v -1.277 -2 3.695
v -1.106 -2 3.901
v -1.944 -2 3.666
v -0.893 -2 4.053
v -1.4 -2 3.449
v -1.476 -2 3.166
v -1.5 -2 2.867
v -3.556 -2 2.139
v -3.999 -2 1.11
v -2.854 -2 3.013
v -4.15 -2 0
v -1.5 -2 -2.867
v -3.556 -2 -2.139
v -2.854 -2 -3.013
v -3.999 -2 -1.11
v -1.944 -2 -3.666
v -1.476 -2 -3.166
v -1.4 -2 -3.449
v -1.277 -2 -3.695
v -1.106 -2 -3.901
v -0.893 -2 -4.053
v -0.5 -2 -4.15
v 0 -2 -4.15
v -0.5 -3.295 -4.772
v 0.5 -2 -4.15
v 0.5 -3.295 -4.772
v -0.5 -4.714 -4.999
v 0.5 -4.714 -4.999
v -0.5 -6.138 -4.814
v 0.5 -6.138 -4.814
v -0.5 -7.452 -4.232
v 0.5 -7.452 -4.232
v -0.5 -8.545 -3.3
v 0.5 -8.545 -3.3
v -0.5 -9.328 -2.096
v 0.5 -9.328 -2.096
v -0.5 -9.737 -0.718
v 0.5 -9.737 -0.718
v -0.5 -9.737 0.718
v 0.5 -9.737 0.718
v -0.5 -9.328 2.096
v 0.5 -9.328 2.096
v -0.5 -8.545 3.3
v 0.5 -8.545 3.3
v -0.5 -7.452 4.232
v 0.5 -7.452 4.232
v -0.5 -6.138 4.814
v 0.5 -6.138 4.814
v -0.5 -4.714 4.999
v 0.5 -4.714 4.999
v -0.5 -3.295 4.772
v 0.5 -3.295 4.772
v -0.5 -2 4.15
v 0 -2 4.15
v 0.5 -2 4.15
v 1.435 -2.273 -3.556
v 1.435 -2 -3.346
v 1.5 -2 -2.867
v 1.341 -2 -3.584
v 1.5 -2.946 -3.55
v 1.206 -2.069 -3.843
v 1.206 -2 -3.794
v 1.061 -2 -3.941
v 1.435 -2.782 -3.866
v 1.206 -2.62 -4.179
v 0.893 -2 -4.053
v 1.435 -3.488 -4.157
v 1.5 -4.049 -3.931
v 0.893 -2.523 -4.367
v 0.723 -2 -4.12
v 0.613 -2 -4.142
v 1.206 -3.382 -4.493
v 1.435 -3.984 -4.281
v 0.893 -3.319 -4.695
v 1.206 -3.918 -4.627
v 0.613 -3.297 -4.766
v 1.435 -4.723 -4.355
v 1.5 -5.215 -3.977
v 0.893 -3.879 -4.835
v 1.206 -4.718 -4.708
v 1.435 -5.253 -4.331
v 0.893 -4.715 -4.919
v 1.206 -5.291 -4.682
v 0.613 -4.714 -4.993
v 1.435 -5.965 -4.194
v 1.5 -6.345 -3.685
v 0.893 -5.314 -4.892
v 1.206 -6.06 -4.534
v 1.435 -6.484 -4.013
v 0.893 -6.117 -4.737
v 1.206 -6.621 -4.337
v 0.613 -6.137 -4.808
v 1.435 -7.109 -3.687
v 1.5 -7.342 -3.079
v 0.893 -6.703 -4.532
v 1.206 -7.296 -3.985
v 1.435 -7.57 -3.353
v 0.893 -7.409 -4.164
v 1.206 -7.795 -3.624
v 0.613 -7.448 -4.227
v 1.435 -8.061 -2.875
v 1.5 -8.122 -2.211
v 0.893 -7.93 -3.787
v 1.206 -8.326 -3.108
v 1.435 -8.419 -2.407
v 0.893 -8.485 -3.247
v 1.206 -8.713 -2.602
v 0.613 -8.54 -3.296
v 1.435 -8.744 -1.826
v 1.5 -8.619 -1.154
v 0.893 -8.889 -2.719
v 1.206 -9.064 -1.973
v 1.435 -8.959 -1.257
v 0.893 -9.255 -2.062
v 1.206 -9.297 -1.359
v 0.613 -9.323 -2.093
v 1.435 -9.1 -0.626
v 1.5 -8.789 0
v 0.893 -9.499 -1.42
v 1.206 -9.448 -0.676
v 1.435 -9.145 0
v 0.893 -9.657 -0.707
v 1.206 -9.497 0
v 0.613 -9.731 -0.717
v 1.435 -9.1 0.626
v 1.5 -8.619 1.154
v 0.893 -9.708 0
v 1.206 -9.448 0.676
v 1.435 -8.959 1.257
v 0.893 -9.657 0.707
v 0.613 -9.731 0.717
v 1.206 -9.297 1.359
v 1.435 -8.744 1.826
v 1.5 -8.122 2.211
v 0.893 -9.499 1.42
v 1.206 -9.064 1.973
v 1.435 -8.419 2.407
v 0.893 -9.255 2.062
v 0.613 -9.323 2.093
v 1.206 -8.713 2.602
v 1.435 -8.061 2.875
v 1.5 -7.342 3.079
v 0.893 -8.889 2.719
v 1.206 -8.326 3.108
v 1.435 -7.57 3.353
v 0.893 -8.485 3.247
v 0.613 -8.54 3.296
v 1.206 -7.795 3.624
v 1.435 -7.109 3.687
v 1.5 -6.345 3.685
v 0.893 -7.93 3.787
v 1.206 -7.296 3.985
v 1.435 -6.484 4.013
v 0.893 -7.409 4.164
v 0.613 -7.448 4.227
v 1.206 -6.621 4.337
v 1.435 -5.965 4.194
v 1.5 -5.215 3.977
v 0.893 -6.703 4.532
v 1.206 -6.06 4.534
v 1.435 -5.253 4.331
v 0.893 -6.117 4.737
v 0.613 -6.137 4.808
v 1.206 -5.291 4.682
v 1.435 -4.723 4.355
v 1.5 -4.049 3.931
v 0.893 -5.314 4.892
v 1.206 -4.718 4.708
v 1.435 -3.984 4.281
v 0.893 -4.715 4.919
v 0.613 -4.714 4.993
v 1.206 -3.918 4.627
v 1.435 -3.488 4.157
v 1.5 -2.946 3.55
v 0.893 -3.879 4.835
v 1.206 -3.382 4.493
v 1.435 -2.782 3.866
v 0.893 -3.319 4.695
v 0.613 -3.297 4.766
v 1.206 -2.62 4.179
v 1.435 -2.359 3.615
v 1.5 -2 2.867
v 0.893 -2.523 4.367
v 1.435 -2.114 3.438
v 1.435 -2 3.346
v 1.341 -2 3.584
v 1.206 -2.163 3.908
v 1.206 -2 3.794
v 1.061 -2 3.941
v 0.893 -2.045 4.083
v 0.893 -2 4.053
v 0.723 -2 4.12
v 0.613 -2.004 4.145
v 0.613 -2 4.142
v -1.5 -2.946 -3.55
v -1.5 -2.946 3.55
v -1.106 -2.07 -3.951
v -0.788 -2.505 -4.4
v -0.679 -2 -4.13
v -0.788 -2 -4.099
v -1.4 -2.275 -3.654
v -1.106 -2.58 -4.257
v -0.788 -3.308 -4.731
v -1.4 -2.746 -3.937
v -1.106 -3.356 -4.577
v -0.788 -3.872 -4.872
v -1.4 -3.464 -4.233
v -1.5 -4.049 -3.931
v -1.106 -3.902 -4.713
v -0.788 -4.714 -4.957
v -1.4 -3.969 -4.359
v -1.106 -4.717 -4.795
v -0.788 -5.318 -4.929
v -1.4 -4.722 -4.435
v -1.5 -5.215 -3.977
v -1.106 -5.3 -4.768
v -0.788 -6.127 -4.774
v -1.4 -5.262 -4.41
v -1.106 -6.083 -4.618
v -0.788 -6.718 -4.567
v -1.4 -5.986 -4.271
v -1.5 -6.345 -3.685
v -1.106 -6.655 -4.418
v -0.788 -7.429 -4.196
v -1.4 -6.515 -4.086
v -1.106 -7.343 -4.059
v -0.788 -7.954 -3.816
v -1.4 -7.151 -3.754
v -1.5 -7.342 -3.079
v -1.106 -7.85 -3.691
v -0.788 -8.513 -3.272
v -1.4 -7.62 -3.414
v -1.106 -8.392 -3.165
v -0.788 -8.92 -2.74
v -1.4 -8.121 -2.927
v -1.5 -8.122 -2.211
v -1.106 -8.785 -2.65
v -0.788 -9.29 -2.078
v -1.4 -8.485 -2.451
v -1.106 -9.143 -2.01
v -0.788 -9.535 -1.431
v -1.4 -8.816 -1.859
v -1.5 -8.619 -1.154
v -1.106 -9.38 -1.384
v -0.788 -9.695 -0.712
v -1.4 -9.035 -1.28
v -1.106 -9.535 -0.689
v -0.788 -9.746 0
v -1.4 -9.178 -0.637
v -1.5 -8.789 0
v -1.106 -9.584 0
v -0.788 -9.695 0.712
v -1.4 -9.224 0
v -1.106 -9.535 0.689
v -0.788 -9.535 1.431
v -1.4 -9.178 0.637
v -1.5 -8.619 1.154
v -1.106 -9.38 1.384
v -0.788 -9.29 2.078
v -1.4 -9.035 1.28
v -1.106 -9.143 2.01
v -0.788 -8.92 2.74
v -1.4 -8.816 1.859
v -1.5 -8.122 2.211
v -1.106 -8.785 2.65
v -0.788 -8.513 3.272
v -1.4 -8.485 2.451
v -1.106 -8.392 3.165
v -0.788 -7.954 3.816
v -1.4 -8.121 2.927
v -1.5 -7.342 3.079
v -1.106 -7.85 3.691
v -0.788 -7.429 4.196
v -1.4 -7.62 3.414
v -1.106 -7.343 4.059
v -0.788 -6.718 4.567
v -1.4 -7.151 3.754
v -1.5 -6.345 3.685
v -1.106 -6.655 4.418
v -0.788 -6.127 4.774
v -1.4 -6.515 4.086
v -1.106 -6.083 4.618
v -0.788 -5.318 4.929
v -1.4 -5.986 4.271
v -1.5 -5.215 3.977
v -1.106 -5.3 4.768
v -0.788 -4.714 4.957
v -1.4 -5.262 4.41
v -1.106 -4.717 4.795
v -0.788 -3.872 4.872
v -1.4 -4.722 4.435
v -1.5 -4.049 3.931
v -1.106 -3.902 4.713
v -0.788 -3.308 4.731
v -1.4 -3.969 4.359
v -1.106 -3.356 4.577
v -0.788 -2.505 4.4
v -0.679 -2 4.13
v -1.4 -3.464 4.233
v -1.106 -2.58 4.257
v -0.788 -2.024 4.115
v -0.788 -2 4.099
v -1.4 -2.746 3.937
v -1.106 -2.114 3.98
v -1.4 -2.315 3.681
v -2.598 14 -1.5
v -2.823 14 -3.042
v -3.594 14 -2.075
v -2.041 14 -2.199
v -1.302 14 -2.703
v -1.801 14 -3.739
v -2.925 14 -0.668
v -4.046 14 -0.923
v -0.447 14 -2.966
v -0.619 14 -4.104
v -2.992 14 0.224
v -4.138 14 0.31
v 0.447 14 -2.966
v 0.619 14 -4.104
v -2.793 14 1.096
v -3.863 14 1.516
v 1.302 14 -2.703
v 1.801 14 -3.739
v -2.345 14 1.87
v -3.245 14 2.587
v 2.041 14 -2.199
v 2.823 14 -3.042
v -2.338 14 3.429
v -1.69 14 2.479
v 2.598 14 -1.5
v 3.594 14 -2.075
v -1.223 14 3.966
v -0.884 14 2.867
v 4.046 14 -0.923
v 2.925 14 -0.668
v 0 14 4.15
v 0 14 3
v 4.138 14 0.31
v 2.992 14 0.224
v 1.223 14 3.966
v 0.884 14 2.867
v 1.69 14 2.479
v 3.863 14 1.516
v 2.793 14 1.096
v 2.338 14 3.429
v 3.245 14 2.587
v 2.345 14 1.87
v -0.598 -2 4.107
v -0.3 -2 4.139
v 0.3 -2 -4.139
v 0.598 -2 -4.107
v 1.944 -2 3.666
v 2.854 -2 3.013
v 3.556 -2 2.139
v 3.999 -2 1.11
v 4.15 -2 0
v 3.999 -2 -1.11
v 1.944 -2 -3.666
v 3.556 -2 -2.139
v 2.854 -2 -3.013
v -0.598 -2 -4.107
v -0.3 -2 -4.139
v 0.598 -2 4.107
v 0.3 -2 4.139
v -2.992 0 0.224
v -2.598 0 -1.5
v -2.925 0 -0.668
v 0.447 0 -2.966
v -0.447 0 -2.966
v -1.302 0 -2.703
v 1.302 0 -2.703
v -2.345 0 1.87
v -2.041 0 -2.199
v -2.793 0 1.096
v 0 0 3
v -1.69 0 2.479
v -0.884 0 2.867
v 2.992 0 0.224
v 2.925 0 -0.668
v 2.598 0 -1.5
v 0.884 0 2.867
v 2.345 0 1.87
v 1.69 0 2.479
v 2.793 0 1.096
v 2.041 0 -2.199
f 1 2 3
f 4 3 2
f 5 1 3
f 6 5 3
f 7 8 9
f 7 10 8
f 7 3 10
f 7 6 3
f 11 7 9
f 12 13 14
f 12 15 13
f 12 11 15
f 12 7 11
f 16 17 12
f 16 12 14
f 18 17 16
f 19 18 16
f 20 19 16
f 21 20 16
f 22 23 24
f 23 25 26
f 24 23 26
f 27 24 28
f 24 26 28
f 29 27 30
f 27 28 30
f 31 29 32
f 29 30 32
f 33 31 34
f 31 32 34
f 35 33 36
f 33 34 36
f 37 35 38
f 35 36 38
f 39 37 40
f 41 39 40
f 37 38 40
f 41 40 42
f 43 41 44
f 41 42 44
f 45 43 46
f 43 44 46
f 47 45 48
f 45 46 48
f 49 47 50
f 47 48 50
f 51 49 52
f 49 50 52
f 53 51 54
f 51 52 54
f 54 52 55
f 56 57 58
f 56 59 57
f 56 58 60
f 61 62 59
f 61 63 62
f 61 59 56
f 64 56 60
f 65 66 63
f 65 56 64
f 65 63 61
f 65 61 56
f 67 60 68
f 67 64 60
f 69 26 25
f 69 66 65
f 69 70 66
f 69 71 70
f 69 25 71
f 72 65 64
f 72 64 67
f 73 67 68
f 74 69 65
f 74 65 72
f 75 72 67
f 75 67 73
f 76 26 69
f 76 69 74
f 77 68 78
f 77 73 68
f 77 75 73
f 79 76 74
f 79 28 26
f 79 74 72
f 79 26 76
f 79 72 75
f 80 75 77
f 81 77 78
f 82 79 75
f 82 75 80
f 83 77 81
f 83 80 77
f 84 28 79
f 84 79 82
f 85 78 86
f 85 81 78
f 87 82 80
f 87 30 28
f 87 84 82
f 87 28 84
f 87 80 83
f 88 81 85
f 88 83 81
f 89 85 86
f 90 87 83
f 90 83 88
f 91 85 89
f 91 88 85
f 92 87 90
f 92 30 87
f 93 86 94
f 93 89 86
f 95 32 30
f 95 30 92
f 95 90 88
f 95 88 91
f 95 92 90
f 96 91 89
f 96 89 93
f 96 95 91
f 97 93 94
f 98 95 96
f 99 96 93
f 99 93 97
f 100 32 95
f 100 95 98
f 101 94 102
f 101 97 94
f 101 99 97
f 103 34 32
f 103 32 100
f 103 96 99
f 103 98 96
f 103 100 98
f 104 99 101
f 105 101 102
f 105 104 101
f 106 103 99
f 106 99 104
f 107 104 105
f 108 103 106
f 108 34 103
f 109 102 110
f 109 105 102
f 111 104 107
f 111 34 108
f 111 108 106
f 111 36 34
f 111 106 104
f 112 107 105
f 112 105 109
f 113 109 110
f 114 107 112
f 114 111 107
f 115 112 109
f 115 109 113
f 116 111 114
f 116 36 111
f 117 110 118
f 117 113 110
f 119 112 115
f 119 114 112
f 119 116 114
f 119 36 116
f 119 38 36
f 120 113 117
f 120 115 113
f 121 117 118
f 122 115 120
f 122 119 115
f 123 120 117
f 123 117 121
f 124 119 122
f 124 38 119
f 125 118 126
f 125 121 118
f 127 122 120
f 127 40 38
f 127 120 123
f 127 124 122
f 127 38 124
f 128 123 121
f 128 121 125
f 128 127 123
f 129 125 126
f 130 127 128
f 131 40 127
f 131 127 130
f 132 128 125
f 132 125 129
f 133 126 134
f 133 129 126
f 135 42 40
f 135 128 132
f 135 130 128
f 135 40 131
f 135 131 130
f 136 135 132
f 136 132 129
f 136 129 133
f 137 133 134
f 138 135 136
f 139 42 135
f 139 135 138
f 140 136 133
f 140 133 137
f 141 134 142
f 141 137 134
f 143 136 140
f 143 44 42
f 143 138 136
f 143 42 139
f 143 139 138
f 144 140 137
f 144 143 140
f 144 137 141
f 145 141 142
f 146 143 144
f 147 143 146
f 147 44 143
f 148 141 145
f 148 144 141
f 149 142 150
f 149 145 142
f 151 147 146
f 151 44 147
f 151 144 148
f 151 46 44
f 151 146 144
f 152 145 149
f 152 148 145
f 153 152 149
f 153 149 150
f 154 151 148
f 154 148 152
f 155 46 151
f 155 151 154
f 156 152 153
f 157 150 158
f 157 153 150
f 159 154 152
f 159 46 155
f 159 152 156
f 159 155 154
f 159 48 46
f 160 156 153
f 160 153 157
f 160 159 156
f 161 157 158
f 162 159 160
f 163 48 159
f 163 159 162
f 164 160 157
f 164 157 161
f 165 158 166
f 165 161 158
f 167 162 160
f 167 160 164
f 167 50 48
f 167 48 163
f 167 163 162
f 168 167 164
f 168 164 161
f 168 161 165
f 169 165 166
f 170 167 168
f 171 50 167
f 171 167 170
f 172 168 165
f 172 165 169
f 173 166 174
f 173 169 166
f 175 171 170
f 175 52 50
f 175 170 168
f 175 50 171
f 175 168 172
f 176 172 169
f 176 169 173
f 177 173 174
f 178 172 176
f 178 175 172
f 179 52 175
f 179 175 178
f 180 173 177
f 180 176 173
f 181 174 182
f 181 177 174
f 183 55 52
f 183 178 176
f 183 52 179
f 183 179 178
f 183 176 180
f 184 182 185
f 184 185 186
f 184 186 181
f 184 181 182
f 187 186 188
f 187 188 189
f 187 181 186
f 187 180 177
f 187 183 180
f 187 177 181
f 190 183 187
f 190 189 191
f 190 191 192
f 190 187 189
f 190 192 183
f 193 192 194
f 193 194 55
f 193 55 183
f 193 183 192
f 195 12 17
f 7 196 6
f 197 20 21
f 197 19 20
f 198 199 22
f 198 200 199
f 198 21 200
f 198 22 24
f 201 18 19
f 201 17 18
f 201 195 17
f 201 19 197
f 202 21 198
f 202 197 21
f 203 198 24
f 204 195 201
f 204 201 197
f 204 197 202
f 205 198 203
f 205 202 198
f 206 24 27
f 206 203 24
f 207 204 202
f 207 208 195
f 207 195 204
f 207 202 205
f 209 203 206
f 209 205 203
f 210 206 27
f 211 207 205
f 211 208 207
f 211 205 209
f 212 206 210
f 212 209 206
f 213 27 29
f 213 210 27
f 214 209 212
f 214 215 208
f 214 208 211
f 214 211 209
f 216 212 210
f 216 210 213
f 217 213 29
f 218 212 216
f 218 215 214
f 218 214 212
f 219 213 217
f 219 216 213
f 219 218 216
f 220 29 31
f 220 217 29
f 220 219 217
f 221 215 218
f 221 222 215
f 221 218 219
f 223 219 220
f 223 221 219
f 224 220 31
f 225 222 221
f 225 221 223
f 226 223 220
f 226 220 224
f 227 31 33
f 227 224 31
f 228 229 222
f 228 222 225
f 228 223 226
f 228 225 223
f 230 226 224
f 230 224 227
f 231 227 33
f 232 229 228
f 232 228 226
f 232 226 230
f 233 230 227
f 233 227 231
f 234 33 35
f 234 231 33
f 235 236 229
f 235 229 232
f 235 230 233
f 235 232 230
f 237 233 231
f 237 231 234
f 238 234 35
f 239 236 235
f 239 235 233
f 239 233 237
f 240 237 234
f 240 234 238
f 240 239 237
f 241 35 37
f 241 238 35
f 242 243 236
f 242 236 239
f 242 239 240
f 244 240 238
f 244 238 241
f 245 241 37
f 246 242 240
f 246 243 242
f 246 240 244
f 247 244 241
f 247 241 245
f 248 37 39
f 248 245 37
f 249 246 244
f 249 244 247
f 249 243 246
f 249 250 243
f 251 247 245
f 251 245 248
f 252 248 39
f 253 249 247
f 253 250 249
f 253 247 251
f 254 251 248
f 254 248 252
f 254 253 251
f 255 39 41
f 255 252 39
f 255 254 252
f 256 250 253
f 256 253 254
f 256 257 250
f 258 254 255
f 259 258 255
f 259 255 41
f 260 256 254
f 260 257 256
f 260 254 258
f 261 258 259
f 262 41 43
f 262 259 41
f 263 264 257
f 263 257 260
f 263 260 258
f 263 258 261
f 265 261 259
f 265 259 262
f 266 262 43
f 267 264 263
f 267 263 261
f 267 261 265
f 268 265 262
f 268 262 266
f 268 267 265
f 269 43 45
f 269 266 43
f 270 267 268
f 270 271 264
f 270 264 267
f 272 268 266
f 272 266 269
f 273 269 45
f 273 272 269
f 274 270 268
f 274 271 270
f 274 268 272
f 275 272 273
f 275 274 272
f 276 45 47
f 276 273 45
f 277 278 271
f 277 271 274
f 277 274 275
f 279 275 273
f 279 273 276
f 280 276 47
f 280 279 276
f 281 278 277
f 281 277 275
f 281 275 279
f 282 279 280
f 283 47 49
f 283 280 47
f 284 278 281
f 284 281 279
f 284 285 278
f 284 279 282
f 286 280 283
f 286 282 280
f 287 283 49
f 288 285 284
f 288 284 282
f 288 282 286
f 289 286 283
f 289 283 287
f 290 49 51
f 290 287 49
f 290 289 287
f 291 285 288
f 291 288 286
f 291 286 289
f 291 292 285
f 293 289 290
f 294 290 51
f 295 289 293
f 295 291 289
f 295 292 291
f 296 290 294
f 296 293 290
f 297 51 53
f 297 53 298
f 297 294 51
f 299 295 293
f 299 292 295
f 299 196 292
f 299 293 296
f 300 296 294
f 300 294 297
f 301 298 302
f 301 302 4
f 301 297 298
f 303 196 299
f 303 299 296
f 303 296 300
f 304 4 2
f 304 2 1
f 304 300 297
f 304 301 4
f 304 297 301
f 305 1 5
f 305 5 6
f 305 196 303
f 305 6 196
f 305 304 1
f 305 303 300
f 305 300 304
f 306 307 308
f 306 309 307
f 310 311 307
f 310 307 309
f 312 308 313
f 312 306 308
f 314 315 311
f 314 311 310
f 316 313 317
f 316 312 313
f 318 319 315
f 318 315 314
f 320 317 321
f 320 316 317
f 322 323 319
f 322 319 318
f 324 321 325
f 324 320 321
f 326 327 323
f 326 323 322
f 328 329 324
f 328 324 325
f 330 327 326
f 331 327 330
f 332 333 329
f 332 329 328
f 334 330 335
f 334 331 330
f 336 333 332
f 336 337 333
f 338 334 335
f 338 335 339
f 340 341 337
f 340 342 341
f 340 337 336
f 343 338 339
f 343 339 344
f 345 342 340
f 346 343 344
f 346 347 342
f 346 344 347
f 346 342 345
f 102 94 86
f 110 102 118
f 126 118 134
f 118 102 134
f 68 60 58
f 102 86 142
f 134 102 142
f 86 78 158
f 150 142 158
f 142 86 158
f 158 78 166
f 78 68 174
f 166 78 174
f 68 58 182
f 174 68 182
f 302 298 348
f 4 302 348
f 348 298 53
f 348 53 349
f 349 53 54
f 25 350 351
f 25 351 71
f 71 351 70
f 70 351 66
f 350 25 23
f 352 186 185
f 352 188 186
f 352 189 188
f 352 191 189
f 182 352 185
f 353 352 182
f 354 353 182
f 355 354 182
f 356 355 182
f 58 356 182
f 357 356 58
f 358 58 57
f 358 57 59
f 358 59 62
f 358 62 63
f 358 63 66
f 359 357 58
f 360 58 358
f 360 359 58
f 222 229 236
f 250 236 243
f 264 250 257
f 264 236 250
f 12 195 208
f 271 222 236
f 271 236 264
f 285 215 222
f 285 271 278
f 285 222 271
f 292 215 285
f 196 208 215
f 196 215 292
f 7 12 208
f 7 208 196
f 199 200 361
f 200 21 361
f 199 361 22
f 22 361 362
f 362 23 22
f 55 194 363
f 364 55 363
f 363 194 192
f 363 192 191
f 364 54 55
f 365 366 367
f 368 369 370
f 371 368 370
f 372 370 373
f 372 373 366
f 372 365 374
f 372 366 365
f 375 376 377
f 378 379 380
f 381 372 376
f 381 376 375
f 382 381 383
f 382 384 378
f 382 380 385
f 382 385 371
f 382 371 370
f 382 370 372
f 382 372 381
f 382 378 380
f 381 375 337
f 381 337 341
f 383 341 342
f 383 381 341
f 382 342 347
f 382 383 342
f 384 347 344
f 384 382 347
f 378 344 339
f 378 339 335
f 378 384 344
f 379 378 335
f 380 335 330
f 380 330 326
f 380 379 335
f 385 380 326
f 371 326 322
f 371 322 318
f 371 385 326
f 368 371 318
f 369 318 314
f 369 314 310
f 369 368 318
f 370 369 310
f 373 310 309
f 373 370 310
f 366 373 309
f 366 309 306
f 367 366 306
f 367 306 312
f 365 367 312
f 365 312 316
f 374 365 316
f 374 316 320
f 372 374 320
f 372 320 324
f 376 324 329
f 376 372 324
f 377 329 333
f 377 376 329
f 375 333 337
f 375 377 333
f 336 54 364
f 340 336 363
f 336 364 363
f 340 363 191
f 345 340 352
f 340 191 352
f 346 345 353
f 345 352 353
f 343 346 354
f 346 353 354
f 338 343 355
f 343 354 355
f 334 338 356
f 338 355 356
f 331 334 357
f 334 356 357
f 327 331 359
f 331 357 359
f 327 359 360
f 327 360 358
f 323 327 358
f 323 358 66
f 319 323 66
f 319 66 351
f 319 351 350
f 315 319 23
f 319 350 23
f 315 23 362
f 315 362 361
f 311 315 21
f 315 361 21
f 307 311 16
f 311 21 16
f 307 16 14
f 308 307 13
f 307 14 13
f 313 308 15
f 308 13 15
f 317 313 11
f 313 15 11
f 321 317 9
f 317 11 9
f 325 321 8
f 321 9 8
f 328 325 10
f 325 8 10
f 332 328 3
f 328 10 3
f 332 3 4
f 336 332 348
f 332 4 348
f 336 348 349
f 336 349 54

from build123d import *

# Parameters (mm, degrees)
SKETCH1_R           = 4.15
SKETCH1_R_2         = 3
BOSS_EXTRUDE1_DEPTH = 14
BOSS_EXTRUDE2_START = -2
SKETCH1_2_R         = 4.15
SKETCH1_2_R_2       = 3
BOSS_EXTRUDE2_DEPTH = 2
BOSS_EXTRUDE3_DEPTH = 1.5
FILLET1_R           = 1


with BuildPart() as part:
    # Sketch1 → Boss-Extrude1 (new body)
    with BuildSketch(Plane(origin=(0, 0, 0), x_dir=(1, 0, 0), z_dir=(0, 1, 0))):
        with Locations(Location((0, 0, 0), (0, 0, 270))):
            Circle(SKETCH1_R)
        with Locations(Location((0, 0, 0), (0, 0, 270))):
            Circle(SKETCH1_R_2, mode=Mode.SUBTRACT)
    extrude(amount=BOSS_EXTRUDE1_DEPTH)

    # Sketch1<2> → Boss-Extrude2 (add)
    # profile 1 of 2: a face of its own
    with BuildSketch(Plane(origin=(0, 0, 0), x_dir=(1, 0, 0), z_dir=(0, 1, 0)).offset(BOSS_EXTRUDE2_START)):
        with Locations(Location((0, 0, 0), (0, 0, 270))):
            Circle(SKETCH1_2_R)
        with Locations(Location((0, 0, 0), (0, 0, 270))):
            Circle(SKETCH1_2_R_2, mode=Mode.SUBTRACT)
    # profile 2 of 2: a face of its own
    with BuildSketch(Plane(origin=(0, 0, 0), x_dir=(1, 0, 0), z_dir=(0, 1, 0)).offset(BOSS_EXTRUDE2_START)):
        with Locations(Location((0, 0, 0), (0, 0, 270))):
            Circle(SKETCH1_2_R_2)
    extrude(amount=BOSS_EXTRUDE2_DEPTH)

    # Sketch3 → Boss-Extrude3 (add, symmetric)
    with BuildSketch(Plane(origin=(0, 0, 0), x_dir=(0, 0, -1), z_dir=(1, 0, 0))):
        with BuildLine():
            Line((-4.15, -2), (4.15, -2))
            ThreePointArc((4.15, -2), (0, -9.788816953), (-4.15, -2))
        make_face()
    extrude(amount=BOSS_EXTRUDE3_DEPTH, both=True)

    # Fillet1
    # the kernel refuses this fillet: 1 mm, written as the material it takes off along each edge
    with BuildSketch(Plane(origin=(-1.5, -4.788816953, 0), x_dir=(0, 0.8881088245588202, -0.45963324046542875), z_dir=(0, 0.45963324046542875, 0.8881088245588202))) as fillet1_piece_1_section:
        with BuildLine():
            CenterArc((5 - FILLET1_R, -FILLET1_R), FILLET1_R, 0, 90)
            Line((5 - FILLET1_R, 0), (5, 0))
            Line((5, 0), (5, -FILLET1_R))
        make_face()
    fillet1_piece_1 = revolve(axis=Axis((-1.5, -4.788816953, 0), (-1, 0, 0)), revolution_arc=305.273112573, mode=Mode.PRIVATE)
    fillet1_piece_1 = split(fillet1_piece_1, bisect_by=Plane(origin=(-1.219469411, -2, 0), z_dir=(0, -1, 0)), keep=Keep.TOP, mode=Mode.PRIVATE)
    add(fillet1_piece_1, mode=Mode.SUBTRACT)
    with BuildSketch(Plane(origin=(1.5, -4.788816953, 0), x_dir=(0, 0.8881088245588202, -0.45963324046542875), z_dir=(0, 0.45963324046542875, 0.8881088245588202))) as fillet1_piece_2_section:
        with BuildLine():
            CenterArc((5 - FILLET1_R, FILLET1_R), FILLET1_R, 270, 90)
            Line((5 - FILLET1_R, 0), (5, 0))
            Line((5, 0), (5, FILLET1_R))
        make_face()
    fillet1_piece_2 = revolve(axis=Axis((1.5, -4.788816953, 0), (-1, 0, 0)), revolution_arc=305.273112573, mode=Mode.PRIVATE)
    fillet1_piece_2 = split(fillet1_piece_2, bisect_by=Plane(origin=(1.219469411, -2, 0), z_dir=(0, -1, 0)), keep=Keep.TOP, mode=Mode.PRIVATE)
    add(fillet1_piece_2, mode=Mode.SUBTRACT)


solid = part.part
